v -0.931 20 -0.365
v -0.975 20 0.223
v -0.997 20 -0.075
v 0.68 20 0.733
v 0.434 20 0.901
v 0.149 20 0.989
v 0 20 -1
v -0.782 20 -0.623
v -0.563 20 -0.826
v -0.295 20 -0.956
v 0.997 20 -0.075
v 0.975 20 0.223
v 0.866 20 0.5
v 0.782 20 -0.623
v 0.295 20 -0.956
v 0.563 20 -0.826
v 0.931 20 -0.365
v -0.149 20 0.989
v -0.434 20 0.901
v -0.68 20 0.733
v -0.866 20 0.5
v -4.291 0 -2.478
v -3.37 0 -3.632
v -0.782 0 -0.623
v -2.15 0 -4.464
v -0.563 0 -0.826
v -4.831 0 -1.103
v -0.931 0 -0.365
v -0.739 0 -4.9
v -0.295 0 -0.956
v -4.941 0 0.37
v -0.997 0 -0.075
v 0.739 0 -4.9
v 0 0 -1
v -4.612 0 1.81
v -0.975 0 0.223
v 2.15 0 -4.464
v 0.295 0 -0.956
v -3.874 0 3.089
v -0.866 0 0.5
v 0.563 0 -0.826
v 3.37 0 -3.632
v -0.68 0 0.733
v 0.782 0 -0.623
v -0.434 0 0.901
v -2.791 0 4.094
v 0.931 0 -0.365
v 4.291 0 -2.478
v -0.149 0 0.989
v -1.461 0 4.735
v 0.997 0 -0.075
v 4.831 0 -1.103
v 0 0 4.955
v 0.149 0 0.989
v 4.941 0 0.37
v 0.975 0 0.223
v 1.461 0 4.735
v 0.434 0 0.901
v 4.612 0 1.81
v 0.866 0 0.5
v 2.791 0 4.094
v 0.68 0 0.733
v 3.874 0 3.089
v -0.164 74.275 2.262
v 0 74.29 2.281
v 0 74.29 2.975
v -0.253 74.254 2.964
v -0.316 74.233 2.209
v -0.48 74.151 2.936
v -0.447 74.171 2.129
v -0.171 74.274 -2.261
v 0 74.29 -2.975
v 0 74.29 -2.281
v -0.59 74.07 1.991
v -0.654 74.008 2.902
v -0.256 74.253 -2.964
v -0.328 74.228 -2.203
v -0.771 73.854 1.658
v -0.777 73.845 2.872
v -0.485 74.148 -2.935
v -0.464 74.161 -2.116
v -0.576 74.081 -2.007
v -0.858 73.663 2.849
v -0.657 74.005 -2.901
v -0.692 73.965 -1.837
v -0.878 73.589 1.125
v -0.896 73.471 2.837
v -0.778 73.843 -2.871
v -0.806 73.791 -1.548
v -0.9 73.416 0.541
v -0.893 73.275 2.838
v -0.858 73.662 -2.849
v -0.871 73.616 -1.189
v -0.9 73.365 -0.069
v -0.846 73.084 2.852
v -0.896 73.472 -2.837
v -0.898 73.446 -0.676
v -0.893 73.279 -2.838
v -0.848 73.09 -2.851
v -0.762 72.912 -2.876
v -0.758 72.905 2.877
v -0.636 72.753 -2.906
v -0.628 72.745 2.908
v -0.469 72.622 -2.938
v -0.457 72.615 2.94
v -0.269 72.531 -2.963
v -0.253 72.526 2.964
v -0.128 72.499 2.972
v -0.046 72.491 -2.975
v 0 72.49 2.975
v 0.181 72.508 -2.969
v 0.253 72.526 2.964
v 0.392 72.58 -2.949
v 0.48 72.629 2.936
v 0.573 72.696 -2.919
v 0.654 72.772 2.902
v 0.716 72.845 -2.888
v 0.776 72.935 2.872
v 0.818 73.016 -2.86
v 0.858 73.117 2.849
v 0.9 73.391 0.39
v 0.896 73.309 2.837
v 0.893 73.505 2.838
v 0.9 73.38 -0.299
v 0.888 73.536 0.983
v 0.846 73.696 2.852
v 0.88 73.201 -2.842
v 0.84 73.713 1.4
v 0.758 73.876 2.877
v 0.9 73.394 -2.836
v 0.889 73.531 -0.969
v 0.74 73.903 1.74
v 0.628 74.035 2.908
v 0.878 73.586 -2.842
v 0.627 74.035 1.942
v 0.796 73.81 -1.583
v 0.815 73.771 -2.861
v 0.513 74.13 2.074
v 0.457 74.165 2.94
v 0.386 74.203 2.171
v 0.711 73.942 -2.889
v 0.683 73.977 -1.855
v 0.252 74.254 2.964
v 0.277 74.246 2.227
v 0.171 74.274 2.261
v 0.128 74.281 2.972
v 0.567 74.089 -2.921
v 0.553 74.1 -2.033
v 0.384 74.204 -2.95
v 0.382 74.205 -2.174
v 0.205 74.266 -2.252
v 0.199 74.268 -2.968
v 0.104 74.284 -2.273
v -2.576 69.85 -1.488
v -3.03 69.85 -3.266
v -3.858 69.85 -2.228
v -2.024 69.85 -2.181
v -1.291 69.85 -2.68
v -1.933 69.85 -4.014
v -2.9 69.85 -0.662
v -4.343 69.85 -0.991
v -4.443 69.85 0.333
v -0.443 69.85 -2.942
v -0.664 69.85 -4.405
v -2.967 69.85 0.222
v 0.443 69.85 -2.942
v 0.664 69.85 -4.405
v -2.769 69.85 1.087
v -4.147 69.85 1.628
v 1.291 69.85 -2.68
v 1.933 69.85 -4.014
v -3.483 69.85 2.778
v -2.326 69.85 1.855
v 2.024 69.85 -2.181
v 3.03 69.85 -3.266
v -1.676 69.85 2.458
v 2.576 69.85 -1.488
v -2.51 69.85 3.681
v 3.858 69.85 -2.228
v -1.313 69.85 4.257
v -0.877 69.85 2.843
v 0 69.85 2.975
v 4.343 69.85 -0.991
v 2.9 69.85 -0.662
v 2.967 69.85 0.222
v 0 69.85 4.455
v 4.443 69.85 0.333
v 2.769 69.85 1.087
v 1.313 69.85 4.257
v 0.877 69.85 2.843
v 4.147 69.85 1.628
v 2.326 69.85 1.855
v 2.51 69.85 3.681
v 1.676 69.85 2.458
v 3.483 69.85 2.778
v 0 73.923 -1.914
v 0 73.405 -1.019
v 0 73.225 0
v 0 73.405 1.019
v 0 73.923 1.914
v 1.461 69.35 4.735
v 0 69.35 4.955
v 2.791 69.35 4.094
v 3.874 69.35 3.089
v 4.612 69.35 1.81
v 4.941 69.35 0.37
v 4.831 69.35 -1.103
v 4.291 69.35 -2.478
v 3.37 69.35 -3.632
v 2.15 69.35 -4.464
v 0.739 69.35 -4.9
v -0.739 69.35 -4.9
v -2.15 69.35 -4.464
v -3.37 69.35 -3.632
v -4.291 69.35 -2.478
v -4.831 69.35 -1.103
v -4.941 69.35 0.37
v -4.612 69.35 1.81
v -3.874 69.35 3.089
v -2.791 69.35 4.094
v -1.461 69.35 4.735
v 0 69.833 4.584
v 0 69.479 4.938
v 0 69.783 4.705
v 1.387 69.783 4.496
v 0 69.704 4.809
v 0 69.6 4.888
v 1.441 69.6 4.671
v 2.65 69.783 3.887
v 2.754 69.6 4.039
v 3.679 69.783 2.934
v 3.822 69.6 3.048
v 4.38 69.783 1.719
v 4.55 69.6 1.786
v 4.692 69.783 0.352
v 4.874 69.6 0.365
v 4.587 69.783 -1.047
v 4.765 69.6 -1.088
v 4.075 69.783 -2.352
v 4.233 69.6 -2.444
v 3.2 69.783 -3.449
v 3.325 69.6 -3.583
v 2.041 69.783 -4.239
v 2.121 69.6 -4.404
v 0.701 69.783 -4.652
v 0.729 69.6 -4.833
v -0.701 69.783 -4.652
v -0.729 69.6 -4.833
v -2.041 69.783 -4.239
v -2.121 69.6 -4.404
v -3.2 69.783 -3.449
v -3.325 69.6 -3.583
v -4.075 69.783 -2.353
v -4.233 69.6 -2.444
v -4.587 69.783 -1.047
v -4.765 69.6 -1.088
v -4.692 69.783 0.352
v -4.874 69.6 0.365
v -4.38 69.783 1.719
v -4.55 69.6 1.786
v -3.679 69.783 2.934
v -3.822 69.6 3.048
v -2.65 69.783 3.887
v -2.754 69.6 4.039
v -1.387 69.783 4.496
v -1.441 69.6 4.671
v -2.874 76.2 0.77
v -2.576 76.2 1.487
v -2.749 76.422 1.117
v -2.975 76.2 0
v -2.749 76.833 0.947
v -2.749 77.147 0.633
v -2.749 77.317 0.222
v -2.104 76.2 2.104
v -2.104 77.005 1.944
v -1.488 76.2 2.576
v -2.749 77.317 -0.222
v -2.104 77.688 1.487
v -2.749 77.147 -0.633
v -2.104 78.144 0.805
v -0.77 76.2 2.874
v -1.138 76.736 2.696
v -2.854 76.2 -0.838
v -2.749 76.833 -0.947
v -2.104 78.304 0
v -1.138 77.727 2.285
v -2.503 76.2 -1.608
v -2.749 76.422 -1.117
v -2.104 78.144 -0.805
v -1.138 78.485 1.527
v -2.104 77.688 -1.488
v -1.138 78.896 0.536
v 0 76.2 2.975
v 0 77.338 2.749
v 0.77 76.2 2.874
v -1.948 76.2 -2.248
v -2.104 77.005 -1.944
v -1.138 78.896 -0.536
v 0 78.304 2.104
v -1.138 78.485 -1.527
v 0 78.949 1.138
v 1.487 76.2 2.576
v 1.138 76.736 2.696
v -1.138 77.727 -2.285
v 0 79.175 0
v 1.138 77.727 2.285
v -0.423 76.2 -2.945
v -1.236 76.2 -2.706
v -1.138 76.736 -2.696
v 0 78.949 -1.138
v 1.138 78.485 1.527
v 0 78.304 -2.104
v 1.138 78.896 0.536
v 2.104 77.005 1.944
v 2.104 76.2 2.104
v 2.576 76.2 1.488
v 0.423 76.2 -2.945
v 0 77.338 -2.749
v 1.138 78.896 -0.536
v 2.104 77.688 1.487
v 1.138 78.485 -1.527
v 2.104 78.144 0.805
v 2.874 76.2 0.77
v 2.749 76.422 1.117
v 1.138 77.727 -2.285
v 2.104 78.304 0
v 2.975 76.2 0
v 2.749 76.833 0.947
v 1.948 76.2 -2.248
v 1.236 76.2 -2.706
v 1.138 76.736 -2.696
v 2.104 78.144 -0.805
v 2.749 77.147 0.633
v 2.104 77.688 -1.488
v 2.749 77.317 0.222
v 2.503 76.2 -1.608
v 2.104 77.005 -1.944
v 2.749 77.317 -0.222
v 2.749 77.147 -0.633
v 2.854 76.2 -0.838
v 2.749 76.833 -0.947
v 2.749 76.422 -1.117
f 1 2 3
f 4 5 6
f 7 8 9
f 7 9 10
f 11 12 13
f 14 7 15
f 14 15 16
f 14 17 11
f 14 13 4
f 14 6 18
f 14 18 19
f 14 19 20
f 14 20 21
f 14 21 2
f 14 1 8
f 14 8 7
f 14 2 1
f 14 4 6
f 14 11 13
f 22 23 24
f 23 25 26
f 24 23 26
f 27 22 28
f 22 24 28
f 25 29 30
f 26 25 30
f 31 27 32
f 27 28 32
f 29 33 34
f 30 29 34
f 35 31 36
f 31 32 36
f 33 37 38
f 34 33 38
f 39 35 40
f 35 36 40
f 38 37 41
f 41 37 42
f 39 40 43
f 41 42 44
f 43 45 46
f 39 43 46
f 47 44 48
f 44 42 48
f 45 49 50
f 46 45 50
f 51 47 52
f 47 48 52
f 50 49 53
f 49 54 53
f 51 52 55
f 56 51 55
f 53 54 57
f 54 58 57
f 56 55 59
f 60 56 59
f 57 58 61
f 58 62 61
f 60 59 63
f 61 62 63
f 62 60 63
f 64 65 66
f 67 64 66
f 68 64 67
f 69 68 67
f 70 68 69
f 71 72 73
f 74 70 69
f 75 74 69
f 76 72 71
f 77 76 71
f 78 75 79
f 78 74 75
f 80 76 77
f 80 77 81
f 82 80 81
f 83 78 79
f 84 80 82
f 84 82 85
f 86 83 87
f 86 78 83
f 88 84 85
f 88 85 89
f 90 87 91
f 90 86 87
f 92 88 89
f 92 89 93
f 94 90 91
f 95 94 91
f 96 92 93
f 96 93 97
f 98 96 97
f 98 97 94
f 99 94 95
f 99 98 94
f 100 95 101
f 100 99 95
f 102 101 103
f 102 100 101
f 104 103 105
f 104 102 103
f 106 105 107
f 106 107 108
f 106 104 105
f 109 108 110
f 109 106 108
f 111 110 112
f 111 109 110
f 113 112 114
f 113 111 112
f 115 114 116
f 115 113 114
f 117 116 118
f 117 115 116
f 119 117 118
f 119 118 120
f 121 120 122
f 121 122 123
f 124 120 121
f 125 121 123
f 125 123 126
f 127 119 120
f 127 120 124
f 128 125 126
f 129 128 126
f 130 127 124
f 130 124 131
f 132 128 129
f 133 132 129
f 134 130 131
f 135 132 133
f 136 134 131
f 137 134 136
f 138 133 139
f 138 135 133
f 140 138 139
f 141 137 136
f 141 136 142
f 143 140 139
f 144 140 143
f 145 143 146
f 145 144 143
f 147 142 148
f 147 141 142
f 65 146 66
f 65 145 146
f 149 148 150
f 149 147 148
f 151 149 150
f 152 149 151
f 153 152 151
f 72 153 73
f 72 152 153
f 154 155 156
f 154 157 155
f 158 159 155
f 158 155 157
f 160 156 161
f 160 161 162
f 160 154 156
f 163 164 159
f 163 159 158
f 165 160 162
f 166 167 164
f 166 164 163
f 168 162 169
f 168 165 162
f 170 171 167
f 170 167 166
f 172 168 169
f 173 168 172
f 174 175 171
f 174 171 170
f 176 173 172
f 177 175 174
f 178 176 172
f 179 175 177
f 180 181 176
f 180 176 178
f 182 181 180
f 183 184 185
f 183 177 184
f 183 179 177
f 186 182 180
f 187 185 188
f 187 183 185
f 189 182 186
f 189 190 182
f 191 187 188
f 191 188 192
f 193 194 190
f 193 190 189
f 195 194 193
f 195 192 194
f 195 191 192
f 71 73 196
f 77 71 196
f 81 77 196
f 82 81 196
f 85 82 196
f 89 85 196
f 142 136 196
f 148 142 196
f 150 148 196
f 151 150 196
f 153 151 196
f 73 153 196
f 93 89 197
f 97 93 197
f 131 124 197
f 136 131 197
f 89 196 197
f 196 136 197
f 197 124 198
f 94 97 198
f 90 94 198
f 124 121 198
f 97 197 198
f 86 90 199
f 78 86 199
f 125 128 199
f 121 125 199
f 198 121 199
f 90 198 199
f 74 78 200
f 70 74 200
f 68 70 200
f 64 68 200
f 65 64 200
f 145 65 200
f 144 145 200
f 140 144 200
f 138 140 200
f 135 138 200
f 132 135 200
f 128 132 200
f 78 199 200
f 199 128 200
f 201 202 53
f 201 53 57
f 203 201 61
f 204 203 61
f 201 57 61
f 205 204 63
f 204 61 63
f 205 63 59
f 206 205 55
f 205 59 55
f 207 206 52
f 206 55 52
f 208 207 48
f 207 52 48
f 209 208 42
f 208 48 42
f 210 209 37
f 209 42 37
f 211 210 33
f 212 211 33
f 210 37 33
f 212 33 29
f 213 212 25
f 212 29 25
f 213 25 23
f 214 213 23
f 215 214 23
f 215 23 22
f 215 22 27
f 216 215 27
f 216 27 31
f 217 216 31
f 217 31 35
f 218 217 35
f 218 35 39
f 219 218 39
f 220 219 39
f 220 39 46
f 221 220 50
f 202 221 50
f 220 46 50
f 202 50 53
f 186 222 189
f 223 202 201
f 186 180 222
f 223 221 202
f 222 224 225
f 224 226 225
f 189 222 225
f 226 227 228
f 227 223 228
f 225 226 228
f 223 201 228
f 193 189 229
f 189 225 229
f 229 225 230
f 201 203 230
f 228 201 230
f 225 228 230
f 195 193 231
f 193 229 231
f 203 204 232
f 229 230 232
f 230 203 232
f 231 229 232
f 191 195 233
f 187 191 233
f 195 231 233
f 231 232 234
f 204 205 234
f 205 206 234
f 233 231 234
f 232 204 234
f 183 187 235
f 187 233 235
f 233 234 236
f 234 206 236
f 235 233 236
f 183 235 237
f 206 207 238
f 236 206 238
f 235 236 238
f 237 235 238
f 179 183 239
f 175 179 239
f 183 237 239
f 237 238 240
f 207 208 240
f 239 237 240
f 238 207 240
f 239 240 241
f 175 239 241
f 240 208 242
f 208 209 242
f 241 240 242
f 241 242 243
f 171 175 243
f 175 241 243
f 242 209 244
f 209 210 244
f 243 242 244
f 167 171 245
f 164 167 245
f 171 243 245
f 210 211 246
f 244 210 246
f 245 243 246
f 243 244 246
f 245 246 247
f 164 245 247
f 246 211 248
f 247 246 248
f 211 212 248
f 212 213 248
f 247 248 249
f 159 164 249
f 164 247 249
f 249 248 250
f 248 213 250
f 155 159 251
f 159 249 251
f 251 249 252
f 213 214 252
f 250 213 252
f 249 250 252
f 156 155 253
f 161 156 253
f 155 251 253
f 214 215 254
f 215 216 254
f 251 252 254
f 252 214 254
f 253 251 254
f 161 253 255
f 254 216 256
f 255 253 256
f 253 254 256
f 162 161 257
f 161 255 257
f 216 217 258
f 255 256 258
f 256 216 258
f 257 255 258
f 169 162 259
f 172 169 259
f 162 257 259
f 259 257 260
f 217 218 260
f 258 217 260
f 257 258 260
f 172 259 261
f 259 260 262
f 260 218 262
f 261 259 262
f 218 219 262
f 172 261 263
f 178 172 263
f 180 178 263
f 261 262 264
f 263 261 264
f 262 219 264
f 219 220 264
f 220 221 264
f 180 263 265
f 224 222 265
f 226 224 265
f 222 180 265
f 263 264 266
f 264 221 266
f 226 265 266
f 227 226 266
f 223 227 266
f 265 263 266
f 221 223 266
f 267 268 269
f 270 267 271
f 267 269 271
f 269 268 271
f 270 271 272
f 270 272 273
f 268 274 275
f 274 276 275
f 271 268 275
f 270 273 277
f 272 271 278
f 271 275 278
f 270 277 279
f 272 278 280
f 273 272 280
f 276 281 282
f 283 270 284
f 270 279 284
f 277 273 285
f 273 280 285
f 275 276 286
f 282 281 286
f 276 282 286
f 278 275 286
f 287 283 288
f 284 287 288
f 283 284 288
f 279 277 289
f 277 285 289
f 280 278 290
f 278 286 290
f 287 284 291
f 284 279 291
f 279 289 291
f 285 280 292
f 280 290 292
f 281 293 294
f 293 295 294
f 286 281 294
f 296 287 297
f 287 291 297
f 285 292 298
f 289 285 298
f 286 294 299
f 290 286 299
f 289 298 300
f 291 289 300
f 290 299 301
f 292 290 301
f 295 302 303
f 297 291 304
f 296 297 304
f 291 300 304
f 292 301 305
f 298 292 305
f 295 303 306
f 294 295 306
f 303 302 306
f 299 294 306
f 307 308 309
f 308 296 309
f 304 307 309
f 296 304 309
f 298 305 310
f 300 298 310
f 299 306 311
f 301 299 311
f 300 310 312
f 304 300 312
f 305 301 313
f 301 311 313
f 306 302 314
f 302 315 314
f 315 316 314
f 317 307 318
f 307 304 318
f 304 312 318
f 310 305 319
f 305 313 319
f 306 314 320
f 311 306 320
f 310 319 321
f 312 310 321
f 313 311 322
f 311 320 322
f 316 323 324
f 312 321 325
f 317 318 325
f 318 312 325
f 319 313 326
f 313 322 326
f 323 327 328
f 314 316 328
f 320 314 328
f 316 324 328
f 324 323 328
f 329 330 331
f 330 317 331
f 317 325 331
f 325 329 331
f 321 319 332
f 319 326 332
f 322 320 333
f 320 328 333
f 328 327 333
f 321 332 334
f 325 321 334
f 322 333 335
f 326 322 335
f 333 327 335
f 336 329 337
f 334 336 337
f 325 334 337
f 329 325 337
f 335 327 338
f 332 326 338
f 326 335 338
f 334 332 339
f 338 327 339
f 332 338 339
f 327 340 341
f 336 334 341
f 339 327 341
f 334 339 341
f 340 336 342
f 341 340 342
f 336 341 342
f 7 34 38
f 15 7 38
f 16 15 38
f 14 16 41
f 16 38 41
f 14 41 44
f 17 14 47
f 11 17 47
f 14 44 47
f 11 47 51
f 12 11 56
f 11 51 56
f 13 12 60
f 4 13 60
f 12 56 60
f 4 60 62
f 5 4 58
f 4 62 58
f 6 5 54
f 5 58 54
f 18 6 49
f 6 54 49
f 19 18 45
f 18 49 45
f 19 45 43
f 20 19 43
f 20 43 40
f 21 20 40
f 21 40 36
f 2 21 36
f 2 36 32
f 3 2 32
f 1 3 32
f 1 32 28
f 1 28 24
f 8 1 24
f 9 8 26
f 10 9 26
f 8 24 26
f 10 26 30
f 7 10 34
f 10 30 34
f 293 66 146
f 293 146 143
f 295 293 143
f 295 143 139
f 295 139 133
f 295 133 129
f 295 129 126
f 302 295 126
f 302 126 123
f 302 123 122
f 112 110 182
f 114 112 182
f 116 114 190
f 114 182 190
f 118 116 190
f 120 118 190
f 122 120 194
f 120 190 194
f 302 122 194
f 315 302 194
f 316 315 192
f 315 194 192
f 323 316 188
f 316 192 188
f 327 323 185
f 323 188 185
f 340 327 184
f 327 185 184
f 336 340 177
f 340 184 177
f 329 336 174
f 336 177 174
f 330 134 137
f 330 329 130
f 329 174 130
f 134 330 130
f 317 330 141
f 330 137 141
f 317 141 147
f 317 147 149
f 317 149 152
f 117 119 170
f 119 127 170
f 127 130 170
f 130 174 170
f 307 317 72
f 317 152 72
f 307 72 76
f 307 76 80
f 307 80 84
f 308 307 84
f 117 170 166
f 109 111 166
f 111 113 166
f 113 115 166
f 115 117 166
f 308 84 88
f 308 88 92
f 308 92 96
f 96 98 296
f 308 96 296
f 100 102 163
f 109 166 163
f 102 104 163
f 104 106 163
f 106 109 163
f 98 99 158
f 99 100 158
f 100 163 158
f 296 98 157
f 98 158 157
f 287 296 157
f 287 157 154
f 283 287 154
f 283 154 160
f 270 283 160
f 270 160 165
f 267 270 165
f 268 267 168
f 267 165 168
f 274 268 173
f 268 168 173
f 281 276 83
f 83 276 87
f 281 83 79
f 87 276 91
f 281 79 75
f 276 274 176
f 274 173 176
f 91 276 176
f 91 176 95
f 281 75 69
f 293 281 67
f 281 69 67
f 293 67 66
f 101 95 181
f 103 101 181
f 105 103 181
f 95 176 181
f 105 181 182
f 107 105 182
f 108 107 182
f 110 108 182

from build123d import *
from build123d.topology import SkipClean

# Parameters (mm, degrees)
SKETCH2_R                 = 4.955
BOTTOM_OF_MOUNT_DEPTH     = 69.85
SKETCH3_R                 = 2.975
TOP_OF_MOUNT_DEPTH        = 6.35
SKETCH4_R                 = 1
SCREW_CUT_IN_BOTTOM_DEPTH = 20
LOCK_IN_HOLE_DEPTH        = 77.52152671
LOCK_IN_HOLE_DEPTH_BACK   = 77.52152671
SKETCH6_R                 = 0.9
FILLET5_R                 = 0.5


with BuildPart() as part:
    # Sketch2 → Bottom of Mount (new body)
    with BuildSketch(Plane(origin=(0, 0, 0), x_dir=(1, 0, 0), z_dir=(0, 1, 0))):
        with Locations(Location((0, 0, 0), (0, 0, 270))):
            Circle(SKETCH2_R)
    extrude(amount=BOTTOM_OF_MOUNT_DEPTH)

    # Sketch3 → Top of Mount (add)
    with BuildSketch(Plane(origin=(0, 69.85, 0), x_dir=(1, 0, 0), z_dir=(0, 1, 0))):
        with Locations(Location((0, 0, 0), (0, 0, 270))):
            Circle(SKETCH3_R)
    extrude(amount=TOP_OF_MOUNT_DEPTH)

    # Sketch4 → Screw Cut in Bottom (cut)
    with BuildSketch(Plane.XZ):
        with Locations(Location((0, 0, 0), (0, 0, 270))):
            Circle(SKETCH4_R)
    extrude(amount=-SCREW_CUT_IN_BOTTOM_DEPTH, mode=Mode.SUBTRACT)

    # Sketch6 → Lock in hole (cut, two sides: drawn at the far end of the back side and taken through both)
    with BuildSketch(Plane.XY.offset(-LOCK_IN_HOLE_DEPTH_BACK)):
        with Locations(Location((0, 73.39, 0), (0, 0, 89.999999984))):
            Circle(SKETCH6_R)
    extrude(amount=LOCK_IN_HOLE_DEPTH + LOCK_IN_HOLE_DEPTH_BACK, mode=Mode.SUBTRACT)

    # Sketch9 → Circular Top (revolve)
    with SkipClean():  # the faces are left unmerged after this step: merging them gives an invalid solid
        with BuildSketch(Plane.XY):
            with BuildLine():
                Line((2.975, 76.2), (-2.975, 76.2))
                ThreePointArc((-2.975, 76.2), (0, 79.175), (2.975, 76.2))
            make_face()
        revolve(axis=Axis((2.975, 76.2, 0), (-1, 0, 0)))

    # Fillet5
    fillet5_edges = [part.edges().sort_by_distance(p)[0] for p in [
        (0, 69.85, -4.955),
    ]]
    fillet(fillet5_edges, radius=FILLET5_R)


solid = part.part
